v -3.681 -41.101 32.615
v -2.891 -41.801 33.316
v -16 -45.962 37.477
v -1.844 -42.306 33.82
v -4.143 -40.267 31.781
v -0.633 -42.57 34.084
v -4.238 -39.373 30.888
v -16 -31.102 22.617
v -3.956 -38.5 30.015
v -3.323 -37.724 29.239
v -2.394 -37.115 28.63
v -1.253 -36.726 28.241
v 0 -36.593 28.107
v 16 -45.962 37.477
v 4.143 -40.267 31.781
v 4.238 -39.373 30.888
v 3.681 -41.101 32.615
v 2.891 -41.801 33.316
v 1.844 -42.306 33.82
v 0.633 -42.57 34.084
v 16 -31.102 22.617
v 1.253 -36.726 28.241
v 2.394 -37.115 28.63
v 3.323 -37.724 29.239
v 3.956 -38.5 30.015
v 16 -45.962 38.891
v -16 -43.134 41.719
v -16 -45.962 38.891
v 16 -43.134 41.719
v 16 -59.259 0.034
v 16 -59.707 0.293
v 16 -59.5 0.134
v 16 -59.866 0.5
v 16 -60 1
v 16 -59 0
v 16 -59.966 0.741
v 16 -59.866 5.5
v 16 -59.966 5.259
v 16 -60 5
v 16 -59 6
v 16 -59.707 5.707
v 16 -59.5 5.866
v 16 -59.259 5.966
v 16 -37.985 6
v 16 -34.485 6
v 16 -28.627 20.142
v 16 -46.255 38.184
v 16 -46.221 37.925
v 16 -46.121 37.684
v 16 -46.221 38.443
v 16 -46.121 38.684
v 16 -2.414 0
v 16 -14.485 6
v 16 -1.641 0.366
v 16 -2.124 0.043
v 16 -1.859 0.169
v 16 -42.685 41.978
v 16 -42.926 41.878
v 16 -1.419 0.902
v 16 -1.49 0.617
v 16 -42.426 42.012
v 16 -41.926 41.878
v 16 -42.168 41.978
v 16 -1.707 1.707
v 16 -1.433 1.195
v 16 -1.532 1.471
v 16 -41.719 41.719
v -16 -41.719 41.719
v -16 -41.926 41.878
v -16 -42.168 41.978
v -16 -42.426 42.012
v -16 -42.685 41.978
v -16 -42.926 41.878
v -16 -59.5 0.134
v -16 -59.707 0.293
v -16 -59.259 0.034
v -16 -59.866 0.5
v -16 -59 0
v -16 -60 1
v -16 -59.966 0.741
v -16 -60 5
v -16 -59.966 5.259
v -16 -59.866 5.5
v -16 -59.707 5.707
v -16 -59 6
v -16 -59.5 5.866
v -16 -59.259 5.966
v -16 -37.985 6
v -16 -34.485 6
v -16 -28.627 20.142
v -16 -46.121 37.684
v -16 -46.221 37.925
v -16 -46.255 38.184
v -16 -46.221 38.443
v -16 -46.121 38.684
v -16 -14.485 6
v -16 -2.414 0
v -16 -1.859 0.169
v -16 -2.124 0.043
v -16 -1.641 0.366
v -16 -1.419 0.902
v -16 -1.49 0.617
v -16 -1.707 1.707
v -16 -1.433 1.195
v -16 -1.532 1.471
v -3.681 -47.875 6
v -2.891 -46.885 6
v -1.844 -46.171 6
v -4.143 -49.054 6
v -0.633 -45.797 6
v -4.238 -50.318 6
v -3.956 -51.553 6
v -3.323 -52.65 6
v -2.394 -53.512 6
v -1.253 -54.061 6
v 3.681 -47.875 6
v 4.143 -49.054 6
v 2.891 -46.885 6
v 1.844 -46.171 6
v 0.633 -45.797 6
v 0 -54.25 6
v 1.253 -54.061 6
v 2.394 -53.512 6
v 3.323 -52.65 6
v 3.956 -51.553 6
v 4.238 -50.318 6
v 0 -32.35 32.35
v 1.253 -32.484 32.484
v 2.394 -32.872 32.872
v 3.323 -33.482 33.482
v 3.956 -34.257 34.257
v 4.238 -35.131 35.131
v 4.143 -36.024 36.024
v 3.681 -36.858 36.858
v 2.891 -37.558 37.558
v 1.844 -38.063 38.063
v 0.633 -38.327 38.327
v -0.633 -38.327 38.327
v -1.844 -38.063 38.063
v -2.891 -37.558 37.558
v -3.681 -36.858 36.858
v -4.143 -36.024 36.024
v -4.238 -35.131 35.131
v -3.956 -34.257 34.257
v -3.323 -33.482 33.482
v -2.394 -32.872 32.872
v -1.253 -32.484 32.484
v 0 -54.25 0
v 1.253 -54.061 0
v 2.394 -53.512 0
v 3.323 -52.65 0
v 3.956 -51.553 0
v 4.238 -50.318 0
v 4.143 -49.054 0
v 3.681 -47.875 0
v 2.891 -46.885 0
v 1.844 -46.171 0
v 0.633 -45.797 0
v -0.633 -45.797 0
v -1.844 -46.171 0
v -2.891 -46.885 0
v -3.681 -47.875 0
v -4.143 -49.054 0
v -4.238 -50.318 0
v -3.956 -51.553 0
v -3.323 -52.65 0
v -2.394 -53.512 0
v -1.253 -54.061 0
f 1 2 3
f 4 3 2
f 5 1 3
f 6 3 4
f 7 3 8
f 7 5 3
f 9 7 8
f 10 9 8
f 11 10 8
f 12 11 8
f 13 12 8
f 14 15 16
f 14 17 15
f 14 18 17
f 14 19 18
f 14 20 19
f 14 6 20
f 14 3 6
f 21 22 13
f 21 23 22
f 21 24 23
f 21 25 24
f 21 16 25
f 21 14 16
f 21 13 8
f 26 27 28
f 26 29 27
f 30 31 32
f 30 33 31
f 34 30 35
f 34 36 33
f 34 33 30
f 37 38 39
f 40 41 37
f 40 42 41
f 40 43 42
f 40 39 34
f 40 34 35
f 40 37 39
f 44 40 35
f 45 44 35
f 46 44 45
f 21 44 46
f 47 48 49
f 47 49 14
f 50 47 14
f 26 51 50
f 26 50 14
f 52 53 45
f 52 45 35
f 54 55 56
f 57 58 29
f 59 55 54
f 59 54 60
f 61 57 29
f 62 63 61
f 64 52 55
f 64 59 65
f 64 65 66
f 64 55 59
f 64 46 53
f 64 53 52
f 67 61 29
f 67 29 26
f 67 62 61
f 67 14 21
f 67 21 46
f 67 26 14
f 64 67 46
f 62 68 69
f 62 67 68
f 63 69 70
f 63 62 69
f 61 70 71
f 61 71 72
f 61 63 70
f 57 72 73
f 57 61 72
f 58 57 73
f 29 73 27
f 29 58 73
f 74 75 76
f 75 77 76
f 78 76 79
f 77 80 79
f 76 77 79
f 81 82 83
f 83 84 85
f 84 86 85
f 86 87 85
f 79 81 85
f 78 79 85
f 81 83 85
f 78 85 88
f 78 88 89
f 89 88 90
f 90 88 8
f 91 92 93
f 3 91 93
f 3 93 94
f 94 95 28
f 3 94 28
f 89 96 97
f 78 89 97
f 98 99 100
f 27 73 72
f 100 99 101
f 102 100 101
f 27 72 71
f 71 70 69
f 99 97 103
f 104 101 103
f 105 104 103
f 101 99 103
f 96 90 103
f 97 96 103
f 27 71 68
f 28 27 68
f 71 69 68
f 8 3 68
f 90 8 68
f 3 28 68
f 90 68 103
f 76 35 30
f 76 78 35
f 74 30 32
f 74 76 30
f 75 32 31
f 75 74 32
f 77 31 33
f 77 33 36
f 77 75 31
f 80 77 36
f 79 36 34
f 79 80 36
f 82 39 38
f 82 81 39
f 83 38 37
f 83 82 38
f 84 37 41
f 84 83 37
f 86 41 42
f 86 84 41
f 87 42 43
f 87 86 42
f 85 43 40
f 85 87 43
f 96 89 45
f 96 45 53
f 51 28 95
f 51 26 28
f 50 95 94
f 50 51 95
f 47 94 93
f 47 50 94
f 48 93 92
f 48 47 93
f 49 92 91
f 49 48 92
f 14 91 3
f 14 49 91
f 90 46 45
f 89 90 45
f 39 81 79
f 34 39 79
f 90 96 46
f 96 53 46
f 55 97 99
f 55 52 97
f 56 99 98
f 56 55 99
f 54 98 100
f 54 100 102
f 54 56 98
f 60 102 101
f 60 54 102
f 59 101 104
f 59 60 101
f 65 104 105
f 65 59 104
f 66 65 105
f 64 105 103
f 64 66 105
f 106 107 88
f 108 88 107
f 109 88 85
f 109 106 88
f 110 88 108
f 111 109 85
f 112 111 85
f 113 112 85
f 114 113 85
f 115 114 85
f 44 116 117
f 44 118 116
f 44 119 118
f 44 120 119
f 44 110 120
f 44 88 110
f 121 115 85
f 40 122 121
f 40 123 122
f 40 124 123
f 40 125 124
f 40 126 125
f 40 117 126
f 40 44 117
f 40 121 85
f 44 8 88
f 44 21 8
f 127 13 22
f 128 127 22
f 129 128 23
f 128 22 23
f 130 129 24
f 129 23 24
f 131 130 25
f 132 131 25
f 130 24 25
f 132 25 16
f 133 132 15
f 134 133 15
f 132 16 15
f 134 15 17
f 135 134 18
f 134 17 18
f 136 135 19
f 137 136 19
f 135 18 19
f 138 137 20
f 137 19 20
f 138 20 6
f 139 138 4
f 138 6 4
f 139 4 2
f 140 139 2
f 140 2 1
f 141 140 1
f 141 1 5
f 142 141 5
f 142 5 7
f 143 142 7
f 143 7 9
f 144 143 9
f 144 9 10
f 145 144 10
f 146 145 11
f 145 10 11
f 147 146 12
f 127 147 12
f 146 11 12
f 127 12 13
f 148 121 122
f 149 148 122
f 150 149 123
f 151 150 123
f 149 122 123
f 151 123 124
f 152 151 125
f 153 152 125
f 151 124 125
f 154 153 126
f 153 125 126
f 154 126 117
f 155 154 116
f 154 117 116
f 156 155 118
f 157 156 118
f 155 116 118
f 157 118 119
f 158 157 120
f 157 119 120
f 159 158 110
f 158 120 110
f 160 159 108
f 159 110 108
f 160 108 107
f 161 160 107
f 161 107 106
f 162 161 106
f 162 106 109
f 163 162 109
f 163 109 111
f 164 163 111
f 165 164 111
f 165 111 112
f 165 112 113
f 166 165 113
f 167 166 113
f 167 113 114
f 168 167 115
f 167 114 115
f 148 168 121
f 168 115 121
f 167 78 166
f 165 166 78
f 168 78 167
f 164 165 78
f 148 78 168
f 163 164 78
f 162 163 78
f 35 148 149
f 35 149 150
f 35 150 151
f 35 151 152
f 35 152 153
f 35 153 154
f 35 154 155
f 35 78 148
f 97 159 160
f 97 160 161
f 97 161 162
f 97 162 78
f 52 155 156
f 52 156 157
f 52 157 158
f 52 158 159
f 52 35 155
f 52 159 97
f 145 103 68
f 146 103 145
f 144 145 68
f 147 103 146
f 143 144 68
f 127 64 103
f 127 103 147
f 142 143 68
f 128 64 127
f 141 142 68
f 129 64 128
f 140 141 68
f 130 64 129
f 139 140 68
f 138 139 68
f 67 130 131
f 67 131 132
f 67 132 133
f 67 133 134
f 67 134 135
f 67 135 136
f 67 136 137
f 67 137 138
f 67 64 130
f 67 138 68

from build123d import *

# Parameters (mm, degrees)
PAD_DEPTH       = 16
SKETCH001_R     = 4.25
POCKET_DEPTH    = 6
SKETCH002_R     = 4.25
POCKET001_DEPTH = 6
FILLET_R        = 1


with BuildPart() as part:
    # Sketch → Pad (new body, symmetric)
    with BuildSketch(Plane.YZ):
        Polygon((-60, 0), (0, 0), (-42.4264068712, 42.4264068712), (-46.6690475583, 38.1837661841), (-31.1022907321, 22.6170093579), (-37.9852813742, 6), (-60, 6), align=None)
        Polygon((-28.627416998, 20.1421356237), (-34.4852813742, 6), (-14.4852813742, 6), align=None, mode=Mode.SUBTRACT)
    extrude(amount=PAD_DEPTH, both=True)

    # Sketch001 (on Face6 of Pad) → Pocket (cut)
    with BuildSketch(Plane(origin=(0, 0, 6), x_dir=(0, -1, 0), z_dir=(0, 0, 1))):
        with Locations((50, 0)):
            Circle(SKETCH001_R)
    extrude(amount=-POCKET_DEPTH, mode=Mode.SUBTRACT)

    # Sketch002 (on Face9 of Pocket) → Pocket001 (cut)
    with BuildSketch(Plane(origin=(0, -4.2426406871, -4.2426406871), x_dir=(0, 0.7071067812, -0.7071067812), z_dir=(0, -0.7071067812, -0.7071067812))):
        with Locations((-50, 0)):
            Circle(SKETCH002_R)
    extrude(amount=-POCKET001_DEPTH, mode=Mode.SUBTRACT)

    # Fillet
    fillet_edges = [part.edges().sort_by_distance(p)[0] for p in [
        (0, 0, 0),
        (0, -60, 0),
        (0, -60, 6),
        (0, -46.669048, 38.183766),
        (0, -42.426407, 42.426407),
    ]]
    fillet(fillet_edges, radius=FILLET_R)


solid = part.part
